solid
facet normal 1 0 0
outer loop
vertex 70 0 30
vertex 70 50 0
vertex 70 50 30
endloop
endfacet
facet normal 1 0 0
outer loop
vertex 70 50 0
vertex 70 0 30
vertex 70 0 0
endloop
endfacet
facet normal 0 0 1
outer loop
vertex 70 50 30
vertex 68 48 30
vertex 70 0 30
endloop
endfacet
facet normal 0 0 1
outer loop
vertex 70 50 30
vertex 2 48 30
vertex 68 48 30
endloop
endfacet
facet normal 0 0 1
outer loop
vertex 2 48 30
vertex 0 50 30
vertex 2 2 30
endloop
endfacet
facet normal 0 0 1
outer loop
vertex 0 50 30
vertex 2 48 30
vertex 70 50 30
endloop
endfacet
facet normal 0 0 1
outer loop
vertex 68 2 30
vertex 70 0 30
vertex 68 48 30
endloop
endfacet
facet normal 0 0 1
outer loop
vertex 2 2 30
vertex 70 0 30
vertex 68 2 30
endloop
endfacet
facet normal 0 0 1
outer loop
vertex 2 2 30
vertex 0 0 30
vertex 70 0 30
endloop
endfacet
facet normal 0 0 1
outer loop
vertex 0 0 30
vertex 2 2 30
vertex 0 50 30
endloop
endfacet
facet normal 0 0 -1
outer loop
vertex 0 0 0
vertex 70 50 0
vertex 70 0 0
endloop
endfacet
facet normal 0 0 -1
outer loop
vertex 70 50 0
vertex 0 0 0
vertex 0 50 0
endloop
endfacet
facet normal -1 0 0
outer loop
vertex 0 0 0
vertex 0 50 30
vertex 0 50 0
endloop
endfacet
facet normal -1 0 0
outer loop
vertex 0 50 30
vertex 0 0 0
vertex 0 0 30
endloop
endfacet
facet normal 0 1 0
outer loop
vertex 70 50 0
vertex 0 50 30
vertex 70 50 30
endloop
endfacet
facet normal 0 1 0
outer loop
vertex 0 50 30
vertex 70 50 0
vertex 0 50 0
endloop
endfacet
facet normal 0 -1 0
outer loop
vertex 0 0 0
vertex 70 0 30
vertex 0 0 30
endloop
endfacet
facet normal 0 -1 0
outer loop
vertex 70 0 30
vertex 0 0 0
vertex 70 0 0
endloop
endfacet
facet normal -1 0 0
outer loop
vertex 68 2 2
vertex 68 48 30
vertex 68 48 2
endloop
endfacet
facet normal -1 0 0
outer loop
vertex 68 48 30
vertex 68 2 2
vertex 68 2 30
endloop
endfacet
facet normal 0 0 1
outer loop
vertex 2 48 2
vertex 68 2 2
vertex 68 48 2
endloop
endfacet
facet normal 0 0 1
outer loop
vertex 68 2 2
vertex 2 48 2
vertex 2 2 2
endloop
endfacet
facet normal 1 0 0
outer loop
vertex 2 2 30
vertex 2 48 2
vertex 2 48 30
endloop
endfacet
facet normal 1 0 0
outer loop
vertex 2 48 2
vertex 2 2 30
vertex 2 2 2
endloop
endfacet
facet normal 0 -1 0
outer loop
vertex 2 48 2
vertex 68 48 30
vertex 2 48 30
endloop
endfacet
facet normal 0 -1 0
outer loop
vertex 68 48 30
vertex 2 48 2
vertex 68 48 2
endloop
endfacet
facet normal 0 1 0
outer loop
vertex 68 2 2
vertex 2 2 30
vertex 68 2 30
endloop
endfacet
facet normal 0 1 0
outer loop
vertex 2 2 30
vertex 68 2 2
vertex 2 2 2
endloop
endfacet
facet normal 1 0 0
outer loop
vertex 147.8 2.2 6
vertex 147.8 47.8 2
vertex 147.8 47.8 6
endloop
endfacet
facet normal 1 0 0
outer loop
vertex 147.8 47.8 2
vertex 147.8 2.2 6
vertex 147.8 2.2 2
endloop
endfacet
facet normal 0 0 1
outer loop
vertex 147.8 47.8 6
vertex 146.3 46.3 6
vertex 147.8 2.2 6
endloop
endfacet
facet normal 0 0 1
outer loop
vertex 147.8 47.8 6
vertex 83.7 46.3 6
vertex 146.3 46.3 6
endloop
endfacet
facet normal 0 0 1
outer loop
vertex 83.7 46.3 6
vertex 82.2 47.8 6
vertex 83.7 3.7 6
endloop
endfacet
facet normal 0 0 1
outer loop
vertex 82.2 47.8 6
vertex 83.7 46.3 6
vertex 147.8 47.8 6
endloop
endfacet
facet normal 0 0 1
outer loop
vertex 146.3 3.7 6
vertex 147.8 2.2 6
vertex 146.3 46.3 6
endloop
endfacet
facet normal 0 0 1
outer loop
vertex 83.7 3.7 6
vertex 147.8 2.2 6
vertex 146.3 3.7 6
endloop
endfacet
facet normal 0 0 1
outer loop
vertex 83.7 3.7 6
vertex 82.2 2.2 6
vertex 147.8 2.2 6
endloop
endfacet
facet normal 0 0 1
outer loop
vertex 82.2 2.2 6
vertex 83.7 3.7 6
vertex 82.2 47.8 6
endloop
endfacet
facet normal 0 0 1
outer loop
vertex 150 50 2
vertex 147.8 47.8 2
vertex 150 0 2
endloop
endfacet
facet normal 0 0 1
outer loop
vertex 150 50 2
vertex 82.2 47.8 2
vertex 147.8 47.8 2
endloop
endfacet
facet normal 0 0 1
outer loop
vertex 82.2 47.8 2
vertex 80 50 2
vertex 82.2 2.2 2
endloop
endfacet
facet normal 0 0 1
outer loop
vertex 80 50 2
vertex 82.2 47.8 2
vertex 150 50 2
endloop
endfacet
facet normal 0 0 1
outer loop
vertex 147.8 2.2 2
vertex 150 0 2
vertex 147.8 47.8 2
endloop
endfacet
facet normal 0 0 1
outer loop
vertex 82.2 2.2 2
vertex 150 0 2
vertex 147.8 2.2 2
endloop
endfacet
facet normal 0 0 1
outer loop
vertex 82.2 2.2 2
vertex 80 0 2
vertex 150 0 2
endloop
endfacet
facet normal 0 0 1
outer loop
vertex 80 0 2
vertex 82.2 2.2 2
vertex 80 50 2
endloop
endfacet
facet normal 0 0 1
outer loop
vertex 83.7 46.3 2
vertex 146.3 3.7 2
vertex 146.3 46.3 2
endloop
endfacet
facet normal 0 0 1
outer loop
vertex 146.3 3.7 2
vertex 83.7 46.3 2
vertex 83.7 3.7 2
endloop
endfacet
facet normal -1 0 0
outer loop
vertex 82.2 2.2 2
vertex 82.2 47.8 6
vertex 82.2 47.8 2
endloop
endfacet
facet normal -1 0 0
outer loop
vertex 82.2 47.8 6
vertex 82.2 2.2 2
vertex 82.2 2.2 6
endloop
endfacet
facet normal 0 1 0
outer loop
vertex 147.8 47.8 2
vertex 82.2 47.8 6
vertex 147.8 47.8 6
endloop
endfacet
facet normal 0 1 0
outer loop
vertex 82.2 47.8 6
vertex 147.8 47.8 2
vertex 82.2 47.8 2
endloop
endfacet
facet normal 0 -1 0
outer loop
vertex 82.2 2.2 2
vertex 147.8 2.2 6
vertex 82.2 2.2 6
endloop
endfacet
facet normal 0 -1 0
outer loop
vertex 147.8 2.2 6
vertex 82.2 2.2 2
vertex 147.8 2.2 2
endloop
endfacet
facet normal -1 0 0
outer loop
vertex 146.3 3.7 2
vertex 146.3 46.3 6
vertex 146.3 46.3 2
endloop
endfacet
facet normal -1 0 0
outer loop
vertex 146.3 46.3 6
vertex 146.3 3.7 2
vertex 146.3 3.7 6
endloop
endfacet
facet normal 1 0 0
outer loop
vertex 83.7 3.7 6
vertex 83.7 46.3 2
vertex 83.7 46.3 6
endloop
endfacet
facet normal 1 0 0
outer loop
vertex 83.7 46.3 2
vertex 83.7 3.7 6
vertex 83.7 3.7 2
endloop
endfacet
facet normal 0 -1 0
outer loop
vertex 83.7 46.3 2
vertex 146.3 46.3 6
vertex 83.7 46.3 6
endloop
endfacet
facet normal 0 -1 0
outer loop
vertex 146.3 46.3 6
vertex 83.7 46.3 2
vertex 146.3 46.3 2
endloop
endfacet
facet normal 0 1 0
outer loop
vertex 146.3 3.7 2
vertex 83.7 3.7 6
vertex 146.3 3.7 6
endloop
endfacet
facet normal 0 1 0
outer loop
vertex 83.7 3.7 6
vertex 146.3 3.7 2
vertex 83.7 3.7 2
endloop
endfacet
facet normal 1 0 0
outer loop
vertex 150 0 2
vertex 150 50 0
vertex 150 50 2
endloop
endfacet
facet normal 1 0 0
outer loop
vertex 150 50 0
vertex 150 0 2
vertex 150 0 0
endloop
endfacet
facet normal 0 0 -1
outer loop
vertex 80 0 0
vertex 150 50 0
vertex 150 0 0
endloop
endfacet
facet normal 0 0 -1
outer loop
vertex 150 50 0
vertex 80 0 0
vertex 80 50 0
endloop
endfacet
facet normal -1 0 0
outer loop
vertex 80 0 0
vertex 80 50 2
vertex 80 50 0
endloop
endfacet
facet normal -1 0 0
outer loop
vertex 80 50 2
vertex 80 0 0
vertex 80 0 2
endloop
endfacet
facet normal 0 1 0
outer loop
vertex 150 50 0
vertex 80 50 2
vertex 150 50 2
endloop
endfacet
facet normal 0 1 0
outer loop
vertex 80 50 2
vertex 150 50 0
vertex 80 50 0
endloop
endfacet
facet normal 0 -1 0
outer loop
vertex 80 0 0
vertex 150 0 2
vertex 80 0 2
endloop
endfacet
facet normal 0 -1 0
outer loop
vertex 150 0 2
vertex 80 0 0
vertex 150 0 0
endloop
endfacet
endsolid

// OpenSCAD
// Two-part electronics enclosure: Box and Lid
// Corrected orientation: Lid plate sits on the bed at Z=0.

// --- Dimensions ---
box_x = 70.0;         // Outer width of box
box_y = 50.0;         // Outer depth of box
box_z = 30.0;         // Outer height of box
wall_t = 2.0;         // Wall thickness
floor_t = 2.0;        // Floor thickness

lid_plate_t = 2.0;    // Thickness of the lid base plate
lid_lip_h = 4.0;      // Height of the lid lip
lid_lip_t = 1.5;      // Thickness of the lid lip wall

// Clearance calculation:
// Box inner dimensions: (70 - 2*2) x (50 - 2*2) = 66 x 46
// Lid lip outer dimensions: 65.6 x 45.6
// Clearance per side: (66 - 65.6)/2 = 0.2mm
lid_lip_x = 65.6;     // Outer width of the lid lip
lid_lip_y = 45.6;     // Outer depth of the lid lip

gap = 10.0;           // Gap between parts on the print bed

$fn = 64;

// --- Part 1: The Box ---
// Sits on XY plane at Z=0
module box() {
    difference() {
        // Main outer body
        cube([box_x, box_y, box_z]);
        
        // Hollow interior
        translate([wall_t, wall_t, floor_t])
            cube([box_x - 2 * wall_t, box_y - 2 * wall_t, box_z + 1]);
    }
}

// --- Part 2: The Lid ---
// Printed with the flat plate on the bed (Z=0)
module lid() {
    union() {
        // The base plate (sits on the bed)
        cube([box_x, box_y, lid_plate_t]);
        
        // The lip (sits on top of the plate)
        translate([(box_x - lid_lip_x) / 2, (box_y - lid_lip_y) / 2, lid_plate_t])
            difference() {
                // Outer lip shape
                cube([lid_lip_x, lid_lip_y, lid_lip_h]);
                // Inner lip cutout (subtracted from the lip)
                translate([lid_lip_t, lid_lip_t, -0.01])
                    cube([lid_lip_x - 2 * lid_lip_t, lid_lip_y - 2 * lid_lip_t, lid_lip_h + 0.02]);
            }
    }
}

// --- Assembly / Layout ---

// Part 1: The Box
// Centered on X/Y for standard layout, but we will use absolute 
// positioning to ensure the gap is calculated correctly.
translate([0, 0, 0]) 
    box();

// Part 2: The Lid
// Positioned on the +X side of the box with a 10mm gap.
// The plate is at Z=0.
translate([box_x + gap, 0, 0])
    lid();
